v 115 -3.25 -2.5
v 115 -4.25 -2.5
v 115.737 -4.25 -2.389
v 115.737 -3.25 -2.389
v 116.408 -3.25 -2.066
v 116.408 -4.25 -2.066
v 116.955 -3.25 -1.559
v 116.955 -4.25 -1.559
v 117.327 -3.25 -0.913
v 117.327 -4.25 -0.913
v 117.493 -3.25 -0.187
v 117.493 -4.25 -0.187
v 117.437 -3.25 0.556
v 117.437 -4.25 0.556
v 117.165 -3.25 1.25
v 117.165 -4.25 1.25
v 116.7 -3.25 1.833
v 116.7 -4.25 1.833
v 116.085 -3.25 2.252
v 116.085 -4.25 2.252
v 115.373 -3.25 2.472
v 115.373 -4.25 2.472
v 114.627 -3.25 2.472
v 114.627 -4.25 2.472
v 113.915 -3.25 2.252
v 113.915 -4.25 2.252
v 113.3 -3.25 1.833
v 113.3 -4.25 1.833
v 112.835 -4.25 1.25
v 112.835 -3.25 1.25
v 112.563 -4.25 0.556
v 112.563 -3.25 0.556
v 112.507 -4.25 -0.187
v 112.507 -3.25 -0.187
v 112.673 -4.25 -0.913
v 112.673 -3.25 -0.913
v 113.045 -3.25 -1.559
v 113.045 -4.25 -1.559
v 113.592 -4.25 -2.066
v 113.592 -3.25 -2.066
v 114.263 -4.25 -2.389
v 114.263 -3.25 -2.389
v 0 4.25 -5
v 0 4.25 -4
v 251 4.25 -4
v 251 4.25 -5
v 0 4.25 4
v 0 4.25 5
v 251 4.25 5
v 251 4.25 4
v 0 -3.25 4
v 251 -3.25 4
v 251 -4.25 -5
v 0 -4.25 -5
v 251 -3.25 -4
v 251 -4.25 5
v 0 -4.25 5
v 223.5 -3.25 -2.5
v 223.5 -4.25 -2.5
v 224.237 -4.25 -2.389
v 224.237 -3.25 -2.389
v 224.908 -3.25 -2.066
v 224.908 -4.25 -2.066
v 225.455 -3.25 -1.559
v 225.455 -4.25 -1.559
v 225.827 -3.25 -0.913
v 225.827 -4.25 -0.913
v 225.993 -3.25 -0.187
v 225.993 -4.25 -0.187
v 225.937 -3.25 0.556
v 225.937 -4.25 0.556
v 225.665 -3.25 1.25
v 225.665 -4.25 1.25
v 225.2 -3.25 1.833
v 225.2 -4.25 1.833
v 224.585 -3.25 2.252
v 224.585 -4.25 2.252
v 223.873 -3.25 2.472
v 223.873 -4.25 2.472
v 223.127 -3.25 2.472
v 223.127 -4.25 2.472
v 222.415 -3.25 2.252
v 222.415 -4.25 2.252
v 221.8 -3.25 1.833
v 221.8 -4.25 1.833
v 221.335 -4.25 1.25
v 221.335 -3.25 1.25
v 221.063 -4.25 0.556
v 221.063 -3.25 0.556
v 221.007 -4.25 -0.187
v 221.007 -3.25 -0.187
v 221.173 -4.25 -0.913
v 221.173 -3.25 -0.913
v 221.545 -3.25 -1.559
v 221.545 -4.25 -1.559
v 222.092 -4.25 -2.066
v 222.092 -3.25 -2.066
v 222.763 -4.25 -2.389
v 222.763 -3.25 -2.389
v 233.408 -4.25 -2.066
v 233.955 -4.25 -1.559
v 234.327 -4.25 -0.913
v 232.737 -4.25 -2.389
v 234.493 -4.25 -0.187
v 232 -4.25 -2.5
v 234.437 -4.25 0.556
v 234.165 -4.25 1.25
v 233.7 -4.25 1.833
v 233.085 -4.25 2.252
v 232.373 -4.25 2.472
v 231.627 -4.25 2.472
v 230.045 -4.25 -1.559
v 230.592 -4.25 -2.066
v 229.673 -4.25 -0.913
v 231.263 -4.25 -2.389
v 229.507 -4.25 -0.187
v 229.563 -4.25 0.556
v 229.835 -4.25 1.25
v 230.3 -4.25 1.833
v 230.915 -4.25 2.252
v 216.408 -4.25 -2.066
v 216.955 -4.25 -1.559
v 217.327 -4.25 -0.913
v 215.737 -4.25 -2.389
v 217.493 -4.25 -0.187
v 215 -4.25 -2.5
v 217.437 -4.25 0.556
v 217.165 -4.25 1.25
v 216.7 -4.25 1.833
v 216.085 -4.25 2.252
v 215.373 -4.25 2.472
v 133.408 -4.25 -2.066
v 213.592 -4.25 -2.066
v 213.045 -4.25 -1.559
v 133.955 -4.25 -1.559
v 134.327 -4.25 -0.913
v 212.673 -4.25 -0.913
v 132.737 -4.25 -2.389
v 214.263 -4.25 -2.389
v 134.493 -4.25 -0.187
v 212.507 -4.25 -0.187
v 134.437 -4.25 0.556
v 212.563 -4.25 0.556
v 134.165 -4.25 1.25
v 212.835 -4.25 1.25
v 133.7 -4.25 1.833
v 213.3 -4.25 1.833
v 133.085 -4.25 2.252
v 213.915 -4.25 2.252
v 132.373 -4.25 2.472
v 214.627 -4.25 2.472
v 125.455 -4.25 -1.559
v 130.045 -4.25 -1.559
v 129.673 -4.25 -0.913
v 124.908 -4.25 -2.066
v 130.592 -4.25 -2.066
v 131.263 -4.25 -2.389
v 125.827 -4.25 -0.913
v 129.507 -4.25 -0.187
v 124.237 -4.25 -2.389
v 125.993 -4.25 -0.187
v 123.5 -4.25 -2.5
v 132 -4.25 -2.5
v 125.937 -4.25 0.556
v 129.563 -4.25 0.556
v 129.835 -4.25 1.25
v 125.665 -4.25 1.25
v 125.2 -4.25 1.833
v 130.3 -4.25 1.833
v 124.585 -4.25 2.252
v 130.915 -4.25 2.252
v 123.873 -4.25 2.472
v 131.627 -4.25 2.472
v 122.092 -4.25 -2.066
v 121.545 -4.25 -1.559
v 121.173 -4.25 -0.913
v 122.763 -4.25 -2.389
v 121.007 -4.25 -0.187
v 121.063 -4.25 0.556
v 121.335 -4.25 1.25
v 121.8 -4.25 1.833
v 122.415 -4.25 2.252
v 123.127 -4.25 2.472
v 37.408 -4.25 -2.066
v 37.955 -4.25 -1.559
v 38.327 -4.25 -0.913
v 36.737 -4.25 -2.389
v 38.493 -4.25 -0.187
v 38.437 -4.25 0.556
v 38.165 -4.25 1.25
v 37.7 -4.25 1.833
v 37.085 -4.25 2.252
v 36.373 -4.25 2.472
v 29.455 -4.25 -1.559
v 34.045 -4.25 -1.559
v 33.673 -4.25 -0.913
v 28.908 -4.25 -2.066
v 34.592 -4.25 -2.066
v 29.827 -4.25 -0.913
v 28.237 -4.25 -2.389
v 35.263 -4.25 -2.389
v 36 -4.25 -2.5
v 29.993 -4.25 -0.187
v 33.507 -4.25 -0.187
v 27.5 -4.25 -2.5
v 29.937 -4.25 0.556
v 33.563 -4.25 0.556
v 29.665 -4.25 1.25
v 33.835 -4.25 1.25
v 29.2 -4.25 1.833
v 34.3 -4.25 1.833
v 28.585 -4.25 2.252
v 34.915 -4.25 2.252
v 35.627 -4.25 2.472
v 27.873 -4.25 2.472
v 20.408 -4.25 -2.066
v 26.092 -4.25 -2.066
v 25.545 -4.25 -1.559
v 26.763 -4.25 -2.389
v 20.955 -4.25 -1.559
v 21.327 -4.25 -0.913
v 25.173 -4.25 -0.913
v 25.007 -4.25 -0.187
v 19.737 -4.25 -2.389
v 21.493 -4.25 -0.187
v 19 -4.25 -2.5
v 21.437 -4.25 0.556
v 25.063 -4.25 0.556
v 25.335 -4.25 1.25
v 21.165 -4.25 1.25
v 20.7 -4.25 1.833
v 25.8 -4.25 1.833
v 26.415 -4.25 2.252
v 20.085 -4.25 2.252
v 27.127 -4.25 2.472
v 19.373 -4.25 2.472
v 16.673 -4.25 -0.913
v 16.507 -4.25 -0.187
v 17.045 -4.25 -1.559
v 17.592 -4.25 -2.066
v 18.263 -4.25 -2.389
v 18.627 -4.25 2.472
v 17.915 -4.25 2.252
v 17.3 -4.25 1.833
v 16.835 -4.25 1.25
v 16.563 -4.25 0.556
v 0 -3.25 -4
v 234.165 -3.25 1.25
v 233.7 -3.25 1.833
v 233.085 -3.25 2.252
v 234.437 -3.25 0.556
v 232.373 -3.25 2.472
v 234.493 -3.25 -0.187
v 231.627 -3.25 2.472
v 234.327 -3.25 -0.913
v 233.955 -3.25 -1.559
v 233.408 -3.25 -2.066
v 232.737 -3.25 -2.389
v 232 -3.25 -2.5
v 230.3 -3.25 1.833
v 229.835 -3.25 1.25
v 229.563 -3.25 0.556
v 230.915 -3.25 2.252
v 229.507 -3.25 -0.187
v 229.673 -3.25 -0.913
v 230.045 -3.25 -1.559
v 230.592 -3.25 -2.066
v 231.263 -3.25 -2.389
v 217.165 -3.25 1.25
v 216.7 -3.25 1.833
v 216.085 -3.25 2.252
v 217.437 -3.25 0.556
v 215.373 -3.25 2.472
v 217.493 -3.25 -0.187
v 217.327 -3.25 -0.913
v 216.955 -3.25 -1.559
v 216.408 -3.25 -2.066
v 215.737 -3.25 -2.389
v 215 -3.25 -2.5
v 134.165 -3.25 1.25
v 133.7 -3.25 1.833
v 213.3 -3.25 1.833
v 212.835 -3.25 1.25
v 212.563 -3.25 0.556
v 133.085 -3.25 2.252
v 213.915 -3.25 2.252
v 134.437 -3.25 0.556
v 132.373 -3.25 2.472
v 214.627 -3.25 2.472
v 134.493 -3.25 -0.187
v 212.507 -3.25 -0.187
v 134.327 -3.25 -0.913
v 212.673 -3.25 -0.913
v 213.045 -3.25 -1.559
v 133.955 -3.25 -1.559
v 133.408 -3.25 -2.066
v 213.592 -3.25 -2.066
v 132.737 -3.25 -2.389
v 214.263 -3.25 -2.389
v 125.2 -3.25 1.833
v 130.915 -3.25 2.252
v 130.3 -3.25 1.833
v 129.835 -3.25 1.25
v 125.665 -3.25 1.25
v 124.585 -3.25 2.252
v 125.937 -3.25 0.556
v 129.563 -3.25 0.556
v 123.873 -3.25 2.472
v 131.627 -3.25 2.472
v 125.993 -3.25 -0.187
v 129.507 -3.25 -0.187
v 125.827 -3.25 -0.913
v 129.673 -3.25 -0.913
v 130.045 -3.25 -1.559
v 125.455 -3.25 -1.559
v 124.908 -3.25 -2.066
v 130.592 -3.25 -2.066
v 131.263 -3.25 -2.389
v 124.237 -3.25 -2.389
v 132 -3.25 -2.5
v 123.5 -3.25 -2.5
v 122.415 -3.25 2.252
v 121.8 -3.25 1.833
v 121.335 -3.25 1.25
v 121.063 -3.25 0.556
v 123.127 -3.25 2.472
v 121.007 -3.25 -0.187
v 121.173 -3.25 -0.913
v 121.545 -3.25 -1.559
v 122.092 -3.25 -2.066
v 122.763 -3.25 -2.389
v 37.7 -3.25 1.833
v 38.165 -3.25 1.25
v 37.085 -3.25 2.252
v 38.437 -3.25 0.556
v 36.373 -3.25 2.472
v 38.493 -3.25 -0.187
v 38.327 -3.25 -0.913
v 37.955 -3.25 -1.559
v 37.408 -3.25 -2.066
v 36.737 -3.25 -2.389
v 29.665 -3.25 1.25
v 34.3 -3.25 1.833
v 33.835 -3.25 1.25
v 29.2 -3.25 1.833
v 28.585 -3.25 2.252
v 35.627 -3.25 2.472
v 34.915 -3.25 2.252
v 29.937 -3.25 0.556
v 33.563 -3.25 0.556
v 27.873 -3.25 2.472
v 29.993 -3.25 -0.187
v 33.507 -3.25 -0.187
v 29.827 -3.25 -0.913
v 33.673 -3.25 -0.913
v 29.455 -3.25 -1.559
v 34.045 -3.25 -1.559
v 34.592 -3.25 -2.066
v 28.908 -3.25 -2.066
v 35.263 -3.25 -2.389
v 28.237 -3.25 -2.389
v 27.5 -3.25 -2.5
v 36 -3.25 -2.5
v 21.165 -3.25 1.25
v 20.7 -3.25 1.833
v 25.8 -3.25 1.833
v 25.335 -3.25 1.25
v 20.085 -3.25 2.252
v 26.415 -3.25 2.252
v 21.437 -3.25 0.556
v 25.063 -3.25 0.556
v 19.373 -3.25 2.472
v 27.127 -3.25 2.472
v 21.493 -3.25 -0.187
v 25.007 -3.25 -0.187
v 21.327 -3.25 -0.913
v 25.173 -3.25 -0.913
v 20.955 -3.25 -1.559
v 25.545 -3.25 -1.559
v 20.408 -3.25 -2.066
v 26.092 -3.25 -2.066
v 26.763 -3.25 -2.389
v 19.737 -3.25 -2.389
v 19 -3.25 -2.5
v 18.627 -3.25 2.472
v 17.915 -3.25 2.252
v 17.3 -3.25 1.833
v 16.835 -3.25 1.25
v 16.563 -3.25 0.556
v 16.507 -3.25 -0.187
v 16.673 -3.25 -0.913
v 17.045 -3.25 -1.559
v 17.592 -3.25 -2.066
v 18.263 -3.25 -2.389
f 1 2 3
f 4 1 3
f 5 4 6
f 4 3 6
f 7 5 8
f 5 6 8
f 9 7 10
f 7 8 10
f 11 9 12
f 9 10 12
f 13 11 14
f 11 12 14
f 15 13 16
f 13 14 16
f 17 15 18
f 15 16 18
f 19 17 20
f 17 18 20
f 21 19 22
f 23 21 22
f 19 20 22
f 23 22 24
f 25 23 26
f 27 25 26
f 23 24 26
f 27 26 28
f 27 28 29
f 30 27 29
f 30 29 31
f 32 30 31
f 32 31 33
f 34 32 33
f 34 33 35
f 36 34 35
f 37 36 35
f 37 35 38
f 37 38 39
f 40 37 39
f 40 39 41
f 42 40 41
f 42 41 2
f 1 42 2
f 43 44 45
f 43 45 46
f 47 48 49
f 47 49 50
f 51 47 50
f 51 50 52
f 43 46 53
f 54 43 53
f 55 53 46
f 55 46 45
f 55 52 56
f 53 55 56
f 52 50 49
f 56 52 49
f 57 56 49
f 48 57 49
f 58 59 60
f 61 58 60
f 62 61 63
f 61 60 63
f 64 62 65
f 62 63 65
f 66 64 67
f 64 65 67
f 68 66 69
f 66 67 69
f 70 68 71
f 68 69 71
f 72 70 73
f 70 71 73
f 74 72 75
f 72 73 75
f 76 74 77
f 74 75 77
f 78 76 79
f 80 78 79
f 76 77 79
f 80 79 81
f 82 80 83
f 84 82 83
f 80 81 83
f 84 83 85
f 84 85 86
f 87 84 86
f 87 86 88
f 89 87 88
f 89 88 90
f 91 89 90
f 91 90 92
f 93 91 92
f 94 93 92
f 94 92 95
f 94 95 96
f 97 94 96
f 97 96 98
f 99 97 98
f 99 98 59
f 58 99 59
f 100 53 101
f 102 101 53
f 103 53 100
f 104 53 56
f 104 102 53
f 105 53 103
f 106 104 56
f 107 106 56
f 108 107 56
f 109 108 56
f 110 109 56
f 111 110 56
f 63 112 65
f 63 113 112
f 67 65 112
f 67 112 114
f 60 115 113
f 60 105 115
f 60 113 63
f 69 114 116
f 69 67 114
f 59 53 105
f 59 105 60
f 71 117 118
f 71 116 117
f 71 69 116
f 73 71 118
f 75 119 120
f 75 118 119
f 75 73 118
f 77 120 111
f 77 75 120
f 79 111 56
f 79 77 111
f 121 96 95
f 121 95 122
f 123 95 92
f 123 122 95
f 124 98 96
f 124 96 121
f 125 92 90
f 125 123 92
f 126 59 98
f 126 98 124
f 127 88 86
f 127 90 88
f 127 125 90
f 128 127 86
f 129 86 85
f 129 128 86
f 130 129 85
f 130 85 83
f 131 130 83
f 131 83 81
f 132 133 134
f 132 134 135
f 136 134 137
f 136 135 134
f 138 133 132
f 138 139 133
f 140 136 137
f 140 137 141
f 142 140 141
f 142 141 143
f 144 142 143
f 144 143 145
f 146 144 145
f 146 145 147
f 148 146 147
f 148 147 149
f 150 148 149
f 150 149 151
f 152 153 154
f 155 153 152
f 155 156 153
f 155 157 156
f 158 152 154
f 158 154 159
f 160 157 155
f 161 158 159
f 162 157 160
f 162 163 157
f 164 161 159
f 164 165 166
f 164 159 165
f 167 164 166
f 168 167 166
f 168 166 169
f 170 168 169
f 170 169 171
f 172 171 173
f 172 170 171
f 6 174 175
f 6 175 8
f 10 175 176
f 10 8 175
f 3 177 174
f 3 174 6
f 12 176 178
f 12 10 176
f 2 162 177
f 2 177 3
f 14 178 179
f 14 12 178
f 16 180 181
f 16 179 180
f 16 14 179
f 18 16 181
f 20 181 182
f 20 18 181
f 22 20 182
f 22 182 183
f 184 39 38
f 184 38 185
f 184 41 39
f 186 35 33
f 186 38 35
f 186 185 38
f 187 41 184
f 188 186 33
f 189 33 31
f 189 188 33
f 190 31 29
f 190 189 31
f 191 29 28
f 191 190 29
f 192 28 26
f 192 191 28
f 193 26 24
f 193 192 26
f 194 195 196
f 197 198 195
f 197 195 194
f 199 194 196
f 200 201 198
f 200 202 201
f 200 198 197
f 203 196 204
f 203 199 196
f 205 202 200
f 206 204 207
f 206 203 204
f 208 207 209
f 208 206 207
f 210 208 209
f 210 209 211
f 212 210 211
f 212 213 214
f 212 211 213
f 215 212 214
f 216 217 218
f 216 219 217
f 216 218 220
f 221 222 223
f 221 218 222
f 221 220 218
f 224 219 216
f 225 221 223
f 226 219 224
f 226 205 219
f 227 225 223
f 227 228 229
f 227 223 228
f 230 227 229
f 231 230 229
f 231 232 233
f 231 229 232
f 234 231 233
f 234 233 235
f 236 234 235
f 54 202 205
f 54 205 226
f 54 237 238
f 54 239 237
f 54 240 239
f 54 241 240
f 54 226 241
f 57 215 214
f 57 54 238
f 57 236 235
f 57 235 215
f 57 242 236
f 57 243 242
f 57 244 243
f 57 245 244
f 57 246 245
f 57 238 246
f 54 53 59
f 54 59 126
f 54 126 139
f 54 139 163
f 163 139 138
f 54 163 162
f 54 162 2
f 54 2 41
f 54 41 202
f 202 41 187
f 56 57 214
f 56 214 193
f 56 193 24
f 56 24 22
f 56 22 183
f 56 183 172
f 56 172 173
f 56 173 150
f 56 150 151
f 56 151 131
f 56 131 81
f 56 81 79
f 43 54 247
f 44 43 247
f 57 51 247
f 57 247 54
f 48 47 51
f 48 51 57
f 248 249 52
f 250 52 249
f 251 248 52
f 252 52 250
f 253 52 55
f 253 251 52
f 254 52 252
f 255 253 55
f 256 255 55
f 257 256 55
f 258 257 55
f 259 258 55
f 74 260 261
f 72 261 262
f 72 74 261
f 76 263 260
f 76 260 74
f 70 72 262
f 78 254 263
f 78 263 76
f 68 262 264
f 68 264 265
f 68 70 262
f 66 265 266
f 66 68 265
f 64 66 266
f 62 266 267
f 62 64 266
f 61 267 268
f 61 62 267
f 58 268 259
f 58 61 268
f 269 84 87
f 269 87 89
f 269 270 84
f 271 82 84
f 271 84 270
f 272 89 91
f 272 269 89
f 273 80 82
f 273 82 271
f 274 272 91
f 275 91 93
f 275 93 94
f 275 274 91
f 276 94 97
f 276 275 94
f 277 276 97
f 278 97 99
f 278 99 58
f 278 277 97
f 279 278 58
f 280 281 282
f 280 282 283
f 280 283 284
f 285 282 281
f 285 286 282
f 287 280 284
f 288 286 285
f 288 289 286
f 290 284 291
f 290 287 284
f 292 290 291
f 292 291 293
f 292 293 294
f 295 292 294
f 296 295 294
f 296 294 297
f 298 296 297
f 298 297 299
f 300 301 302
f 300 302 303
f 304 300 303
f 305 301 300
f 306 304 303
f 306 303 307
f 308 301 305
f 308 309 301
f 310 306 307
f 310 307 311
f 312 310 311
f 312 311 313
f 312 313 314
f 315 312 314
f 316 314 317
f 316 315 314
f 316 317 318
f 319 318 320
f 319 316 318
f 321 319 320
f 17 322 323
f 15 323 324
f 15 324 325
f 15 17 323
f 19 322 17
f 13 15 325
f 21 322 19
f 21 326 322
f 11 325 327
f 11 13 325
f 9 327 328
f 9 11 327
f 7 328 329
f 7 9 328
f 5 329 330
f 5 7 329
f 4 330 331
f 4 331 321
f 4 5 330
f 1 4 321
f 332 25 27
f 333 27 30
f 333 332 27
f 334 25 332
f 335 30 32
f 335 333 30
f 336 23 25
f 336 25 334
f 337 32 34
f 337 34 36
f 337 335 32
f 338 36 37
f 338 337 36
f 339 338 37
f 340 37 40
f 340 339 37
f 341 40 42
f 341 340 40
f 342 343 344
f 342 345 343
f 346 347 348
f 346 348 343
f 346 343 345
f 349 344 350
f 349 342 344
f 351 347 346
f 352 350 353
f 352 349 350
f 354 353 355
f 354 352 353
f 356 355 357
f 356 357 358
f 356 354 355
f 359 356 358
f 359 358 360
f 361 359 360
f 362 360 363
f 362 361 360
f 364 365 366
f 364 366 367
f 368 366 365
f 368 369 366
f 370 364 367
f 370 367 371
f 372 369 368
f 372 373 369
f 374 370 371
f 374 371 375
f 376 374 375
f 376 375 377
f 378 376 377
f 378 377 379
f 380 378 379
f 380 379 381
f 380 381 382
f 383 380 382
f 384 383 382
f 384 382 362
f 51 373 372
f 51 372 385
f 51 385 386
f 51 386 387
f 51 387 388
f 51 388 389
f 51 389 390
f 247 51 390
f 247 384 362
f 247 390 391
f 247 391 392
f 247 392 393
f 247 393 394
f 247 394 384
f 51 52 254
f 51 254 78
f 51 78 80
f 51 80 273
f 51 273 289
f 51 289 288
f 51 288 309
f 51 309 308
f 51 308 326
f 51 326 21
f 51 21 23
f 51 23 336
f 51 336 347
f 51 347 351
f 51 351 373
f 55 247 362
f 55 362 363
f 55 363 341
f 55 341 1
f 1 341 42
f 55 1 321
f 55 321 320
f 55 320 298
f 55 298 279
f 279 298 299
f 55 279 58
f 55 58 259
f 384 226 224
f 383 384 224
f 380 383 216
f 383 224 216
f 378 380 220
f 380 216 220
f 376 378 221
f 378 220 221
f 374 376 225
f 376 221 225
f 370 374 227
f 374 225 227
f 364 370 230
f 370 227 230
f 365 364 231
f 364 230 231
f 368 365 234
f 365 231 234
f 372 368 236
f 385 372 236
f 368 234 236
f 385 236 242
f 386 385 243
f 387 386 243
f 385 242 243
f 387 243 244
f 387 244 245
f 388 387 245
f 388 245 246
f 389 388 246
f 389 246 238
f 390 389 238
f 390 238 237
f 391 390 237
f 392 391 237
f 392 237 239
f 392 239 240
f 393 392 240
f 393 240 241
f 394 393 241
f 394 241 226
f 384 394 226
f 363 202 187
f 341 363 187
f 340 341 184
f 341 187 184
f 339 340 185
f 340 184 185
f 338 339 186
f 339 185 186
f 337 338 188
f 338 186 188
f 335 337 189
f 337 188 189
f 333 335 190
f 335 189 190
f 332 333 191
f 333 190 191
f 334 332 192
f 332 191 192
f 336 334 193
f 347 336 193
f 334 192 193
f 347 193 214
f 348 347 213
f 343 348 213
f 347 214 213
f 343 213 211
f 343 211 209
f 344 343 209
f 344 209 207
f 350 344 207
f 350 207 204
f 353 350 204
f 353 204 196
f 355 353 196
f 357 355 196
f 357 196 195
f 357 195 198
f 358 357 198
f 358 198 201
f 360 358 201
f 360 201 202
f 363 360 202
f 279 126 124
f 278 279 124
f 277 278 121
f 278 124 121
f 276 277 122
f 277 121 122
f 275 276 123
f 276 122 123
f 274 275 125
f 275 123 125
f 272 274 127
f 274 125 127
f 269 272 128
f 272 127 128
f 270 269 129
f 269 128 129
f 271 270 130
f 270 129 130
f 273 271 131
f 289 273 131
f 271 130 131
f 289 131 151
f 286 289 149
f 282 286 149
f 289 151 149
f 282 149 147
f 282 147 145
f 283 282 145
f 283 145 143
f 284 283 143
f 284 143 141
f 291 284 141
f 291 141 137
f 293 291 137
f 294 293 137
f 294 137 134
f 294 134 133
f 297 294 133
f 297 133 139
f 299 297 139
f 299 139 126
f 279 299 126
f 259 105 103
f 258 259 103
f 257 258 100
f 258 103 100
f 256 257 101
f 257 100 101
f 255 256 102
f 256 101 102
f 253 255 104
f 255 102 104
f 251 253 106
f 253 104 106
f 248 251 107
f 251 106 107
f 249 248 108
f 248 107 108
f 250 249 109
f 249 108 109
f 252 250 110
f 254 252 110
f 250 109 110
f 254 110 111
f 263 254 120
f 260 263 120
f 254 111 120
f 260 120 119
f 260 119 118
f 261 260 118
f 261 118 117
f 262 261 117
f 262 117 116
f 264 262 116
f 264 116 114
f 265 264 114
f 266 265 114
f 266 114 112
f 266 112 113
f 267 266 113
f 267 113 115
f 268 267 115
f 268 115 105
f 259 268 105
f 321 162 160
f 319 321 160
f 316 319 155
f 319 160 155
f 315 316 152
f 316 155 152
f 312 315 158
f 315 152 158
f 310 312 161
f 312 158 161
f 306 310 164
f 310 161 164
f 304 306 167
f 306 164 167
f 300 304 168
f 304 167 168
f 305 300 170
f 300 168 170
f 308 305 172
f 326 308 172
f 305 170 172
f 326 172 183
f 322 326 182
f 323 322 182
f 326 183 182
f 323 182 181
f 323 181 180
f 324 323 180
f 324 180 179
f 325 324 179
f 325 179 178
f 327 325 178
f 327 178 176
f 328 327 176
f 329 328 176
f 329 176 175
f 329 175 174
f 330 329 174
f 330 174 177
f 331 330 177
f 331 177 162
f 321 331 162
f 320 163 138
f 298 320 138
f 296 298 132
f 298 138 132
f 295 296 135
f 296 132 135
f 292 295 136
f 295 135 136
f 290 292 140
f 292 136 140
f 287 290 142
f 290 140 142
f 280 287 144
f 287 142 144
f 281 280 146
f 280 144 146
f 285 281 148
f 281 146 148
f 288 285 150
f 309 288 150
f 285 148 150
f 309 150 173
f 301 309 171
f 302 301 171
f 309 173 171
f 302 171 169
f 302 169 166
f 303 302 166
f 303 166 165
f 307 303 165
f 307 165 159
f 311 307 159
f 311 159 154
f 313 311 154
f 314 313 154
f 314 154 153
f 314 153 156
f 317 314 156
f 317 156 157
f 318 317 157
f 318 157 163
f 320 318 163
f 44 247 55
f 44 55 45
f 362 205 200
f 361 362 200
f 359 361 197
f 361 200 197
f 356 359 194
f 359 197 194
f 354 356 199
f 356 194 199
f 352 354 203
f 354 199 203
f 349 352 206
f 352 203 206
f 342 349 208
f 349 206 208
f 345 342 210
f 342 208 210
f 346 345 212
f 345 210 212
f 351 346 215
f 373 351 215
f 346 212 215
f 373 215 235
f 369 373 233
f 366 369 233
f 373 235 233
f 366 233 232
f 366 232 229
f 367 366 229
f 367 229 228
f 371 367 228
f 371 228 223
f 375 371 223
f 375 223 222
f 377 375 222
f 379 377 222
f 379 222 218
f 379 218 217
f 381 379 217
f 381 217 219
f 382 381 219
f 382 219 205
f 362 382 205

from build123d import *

# Parameters (mm, degrees)
BOSS_EXTRUDE1_DEPTH = 251
CUT_EXTRUDE1_REACH  = 253.194
SKETCH3_R           = 2.5


with BuildPart() as part:
    # Sketch2 → Boss-Extrude1 (new body)
    with BuildSketch(Plane(origin=(0, 0, 0), x_dir=(0, 0, -1), z_dir=(1, 0, 0))):
        Polygon((-4, 4.25), (-4, -3.25), (4, -3.25), (4, 4.25), (5, 4.25), (5, -4.25), (-5, -4.25), (-5, 4.25), align=None)
    extrude(amount=BOSS_EXTRUDE1_DEPTH)

    # Sketch3 → Cut-Extrude1 (cut, up to next)
    with BuildSketch(Plane.XZ.offset(4.25), mode=Mode.PRIVATE) as cut_extrude1_sk1:
        with Locations(Location((19, 0, 0), (0, 0, 270))):
            Circle(SKETCH3_R)
    cut_extrude1_tool1 = extrude(cut_extrude1_sk1.sketch, amount=-CUT_EXTRUDE1_REACH, mode=Mode.PRIVATE) & part.part
    # Sketch3 → Cut-Extrude1 (cut, up to next)
    with BuildSketch(Plane.XZ.offset(4.25), mode=Mode.PRIVATE) as cut_extrude1_sk2:
        with Locations(Location((27.5, 0, 0), (0, 0, 270))):
            Circle(SKETCH3_R)
    cut_extrude1_tool2 = extrude(cut_extrude1_sk2.sketch, amount=-CUT_EXTRUDE1_REACH, mode=Mode.PRIVATE) & part.part
    # Sketch3 → Cut-Extrude1 (cut, up to next)
    with BuildSketch(Plane.XZ.offset(4.25), mode=Mode.PRIVATE) as cut_extrude1_sk3:
        with Locations(Location((36, 0, 0), (0, 0, 270))):
            Circle(SKETCH3_R)
    cut_extrude1_tool3 = extrude(cut_extrude1_sk3.sketch, amount=-CUT_EXTRUDE1_REACH, mode=Mode.PRIVATE) & part.part
    # Sketch3 → Cut-Extrude1 (cut, up to next)
    with BuildSketch(Plane.XZ.offset(4.25), mode=Mode.PRIVATE) as cut_extrude1_sk4:
        with Locations(Location((115, 0, 0), (0, 0, 270))):
            Circle(SKETCH3_R)
    cut_extrude1_tool4 = extrude(cut_extrude1_sk4.sketch, amount=-CUT_EXTRUDE1_REACH, mode=Mode.PRIVATE) & part.part
    # Sketch3 → Cut-Extrude1 (cut, up to next)
    with BuildSketch(Plane.XZ.offset(4.25), mode=Mode.PRIVATE) as cut_extrude1_sk5:
        with Locations(Location((123.5, 0, 0), (0, 0, 270))):
            Circle(SKETCH3_R)
    cut_extrude1_tool5 = extrude(cut_extrude1_sk5.sketch, amount=-CUT_EXTRUDE1_REACH, mode=Mode.PRIVATE) & part.part
    # Sketch3 → Cut-Extrude1 (cut, up to next)
    with BuildSketch(Plane.XZ.offset(4.25), mode=Mode.PRIVATE) as cut_extrude1_sk6:
        with Locations(Location((132, 0, 0), (0, 0, 270))):
            Circle(SKETCH3_R)
    cut_extrude1_tool6 = extrude(cut_extrude1_sk6.sketch, amount=-CUT_EXTRUDE1_REACH, mode=Mode.PRIVATE) & part.part
    # Sketch3 → Cut-Extrude1 (cut, up to next)
    with BuildSketch(Plane.XZ.offset(4.25), mode=Mode.PRIVATE) as cut_extrude1_sk7:
        with Locations(Location((232, 0, 0), (0, 0, 270))):
            Circle(SKETCH3_R)
    cut_extrude1_tool7 = extrude(cut_extrude1_sk7.sketch, amount=-CUT_EXTRUDE1_REACH, mode=Mode.PRIVATE) & part.part
    # Sketch3 → Cut-Extrude1 (cut, up to next)
    with BuildSketch(Plane.XZ.offset(4.25), mode=Mode.PRIVATE) as cut_extrude1_sk8:
        with Locations(Location((223.5, 0, 0), (0, 0, 270))):
            Circle(SKETCH3_R)
    cut_extrude1_tool8 = extrude(cut_extrude1_sk8.sketch, amount=-CUT_EXTRUDE1_REACH, mode=Mode.PRIVATE) & part.part
    # Sketch3 → Cut-Extrude1 (cut, up to next)
    with BuildSketch(Plane.XZ.offset(4.25), mode=Mode.PRIVATE) as cut_extrude1_sk9:
        with Locations(Location((215, 0, 0), (0, 0, 270))):
            Circle(SKETCH3_R)
    cut_extrude1_tool9 = extrude(cut_extrude1_sk9.sketch, amount=-CUT_EXTRUDE1_REACH, mode=Mode.PRIVATE) & part.part
    add(cut_extrude1_tool1.solids().sort_by_distance((19, -4.25, 0))[0], mode=Mode.SUBTRACT)
    add(cut_extrude1_tool2.solids().sort_by_distance((27.5, -4.25, 0))[0], mode=Mode.SUBTRACT)
    add(cut_extrude1_tool3.solids().sort_by_distance((36, -4.25, 0))[0], mode=Mode.SUBTRACT)
    add(cut_extrude1_tool4.solids().sort_by_distance((115, -4.25, 0))[0], mode=Mode.SUBTRACT)
    add(cut_extrude1_tool5.solids().sort_by_distance((123.5, -4.25, 0))[0], mode=Mode.SUBTRACT)
    add(cut_extrude1_tool6.solids().sort_by_distance((132, -4.25, 0))[0], mode=Mode.SUBTRACT)
    add(cut_extrude1_tool7.solids().sort_by_distance((232, -4.25, 0))[0], mode=Mode.SUBTRACT)
    add(cut_extrude1_tool8.solids().sort_by_distance((223.5, -4.25, 0))[0], mode=Mode.SUBTRACT)
    add(cut_extrude1_tool9.solids().sort_by_distance((215, -4.25, 0))[0], mode=Mode.SUBTRACT)


solid = part.part
